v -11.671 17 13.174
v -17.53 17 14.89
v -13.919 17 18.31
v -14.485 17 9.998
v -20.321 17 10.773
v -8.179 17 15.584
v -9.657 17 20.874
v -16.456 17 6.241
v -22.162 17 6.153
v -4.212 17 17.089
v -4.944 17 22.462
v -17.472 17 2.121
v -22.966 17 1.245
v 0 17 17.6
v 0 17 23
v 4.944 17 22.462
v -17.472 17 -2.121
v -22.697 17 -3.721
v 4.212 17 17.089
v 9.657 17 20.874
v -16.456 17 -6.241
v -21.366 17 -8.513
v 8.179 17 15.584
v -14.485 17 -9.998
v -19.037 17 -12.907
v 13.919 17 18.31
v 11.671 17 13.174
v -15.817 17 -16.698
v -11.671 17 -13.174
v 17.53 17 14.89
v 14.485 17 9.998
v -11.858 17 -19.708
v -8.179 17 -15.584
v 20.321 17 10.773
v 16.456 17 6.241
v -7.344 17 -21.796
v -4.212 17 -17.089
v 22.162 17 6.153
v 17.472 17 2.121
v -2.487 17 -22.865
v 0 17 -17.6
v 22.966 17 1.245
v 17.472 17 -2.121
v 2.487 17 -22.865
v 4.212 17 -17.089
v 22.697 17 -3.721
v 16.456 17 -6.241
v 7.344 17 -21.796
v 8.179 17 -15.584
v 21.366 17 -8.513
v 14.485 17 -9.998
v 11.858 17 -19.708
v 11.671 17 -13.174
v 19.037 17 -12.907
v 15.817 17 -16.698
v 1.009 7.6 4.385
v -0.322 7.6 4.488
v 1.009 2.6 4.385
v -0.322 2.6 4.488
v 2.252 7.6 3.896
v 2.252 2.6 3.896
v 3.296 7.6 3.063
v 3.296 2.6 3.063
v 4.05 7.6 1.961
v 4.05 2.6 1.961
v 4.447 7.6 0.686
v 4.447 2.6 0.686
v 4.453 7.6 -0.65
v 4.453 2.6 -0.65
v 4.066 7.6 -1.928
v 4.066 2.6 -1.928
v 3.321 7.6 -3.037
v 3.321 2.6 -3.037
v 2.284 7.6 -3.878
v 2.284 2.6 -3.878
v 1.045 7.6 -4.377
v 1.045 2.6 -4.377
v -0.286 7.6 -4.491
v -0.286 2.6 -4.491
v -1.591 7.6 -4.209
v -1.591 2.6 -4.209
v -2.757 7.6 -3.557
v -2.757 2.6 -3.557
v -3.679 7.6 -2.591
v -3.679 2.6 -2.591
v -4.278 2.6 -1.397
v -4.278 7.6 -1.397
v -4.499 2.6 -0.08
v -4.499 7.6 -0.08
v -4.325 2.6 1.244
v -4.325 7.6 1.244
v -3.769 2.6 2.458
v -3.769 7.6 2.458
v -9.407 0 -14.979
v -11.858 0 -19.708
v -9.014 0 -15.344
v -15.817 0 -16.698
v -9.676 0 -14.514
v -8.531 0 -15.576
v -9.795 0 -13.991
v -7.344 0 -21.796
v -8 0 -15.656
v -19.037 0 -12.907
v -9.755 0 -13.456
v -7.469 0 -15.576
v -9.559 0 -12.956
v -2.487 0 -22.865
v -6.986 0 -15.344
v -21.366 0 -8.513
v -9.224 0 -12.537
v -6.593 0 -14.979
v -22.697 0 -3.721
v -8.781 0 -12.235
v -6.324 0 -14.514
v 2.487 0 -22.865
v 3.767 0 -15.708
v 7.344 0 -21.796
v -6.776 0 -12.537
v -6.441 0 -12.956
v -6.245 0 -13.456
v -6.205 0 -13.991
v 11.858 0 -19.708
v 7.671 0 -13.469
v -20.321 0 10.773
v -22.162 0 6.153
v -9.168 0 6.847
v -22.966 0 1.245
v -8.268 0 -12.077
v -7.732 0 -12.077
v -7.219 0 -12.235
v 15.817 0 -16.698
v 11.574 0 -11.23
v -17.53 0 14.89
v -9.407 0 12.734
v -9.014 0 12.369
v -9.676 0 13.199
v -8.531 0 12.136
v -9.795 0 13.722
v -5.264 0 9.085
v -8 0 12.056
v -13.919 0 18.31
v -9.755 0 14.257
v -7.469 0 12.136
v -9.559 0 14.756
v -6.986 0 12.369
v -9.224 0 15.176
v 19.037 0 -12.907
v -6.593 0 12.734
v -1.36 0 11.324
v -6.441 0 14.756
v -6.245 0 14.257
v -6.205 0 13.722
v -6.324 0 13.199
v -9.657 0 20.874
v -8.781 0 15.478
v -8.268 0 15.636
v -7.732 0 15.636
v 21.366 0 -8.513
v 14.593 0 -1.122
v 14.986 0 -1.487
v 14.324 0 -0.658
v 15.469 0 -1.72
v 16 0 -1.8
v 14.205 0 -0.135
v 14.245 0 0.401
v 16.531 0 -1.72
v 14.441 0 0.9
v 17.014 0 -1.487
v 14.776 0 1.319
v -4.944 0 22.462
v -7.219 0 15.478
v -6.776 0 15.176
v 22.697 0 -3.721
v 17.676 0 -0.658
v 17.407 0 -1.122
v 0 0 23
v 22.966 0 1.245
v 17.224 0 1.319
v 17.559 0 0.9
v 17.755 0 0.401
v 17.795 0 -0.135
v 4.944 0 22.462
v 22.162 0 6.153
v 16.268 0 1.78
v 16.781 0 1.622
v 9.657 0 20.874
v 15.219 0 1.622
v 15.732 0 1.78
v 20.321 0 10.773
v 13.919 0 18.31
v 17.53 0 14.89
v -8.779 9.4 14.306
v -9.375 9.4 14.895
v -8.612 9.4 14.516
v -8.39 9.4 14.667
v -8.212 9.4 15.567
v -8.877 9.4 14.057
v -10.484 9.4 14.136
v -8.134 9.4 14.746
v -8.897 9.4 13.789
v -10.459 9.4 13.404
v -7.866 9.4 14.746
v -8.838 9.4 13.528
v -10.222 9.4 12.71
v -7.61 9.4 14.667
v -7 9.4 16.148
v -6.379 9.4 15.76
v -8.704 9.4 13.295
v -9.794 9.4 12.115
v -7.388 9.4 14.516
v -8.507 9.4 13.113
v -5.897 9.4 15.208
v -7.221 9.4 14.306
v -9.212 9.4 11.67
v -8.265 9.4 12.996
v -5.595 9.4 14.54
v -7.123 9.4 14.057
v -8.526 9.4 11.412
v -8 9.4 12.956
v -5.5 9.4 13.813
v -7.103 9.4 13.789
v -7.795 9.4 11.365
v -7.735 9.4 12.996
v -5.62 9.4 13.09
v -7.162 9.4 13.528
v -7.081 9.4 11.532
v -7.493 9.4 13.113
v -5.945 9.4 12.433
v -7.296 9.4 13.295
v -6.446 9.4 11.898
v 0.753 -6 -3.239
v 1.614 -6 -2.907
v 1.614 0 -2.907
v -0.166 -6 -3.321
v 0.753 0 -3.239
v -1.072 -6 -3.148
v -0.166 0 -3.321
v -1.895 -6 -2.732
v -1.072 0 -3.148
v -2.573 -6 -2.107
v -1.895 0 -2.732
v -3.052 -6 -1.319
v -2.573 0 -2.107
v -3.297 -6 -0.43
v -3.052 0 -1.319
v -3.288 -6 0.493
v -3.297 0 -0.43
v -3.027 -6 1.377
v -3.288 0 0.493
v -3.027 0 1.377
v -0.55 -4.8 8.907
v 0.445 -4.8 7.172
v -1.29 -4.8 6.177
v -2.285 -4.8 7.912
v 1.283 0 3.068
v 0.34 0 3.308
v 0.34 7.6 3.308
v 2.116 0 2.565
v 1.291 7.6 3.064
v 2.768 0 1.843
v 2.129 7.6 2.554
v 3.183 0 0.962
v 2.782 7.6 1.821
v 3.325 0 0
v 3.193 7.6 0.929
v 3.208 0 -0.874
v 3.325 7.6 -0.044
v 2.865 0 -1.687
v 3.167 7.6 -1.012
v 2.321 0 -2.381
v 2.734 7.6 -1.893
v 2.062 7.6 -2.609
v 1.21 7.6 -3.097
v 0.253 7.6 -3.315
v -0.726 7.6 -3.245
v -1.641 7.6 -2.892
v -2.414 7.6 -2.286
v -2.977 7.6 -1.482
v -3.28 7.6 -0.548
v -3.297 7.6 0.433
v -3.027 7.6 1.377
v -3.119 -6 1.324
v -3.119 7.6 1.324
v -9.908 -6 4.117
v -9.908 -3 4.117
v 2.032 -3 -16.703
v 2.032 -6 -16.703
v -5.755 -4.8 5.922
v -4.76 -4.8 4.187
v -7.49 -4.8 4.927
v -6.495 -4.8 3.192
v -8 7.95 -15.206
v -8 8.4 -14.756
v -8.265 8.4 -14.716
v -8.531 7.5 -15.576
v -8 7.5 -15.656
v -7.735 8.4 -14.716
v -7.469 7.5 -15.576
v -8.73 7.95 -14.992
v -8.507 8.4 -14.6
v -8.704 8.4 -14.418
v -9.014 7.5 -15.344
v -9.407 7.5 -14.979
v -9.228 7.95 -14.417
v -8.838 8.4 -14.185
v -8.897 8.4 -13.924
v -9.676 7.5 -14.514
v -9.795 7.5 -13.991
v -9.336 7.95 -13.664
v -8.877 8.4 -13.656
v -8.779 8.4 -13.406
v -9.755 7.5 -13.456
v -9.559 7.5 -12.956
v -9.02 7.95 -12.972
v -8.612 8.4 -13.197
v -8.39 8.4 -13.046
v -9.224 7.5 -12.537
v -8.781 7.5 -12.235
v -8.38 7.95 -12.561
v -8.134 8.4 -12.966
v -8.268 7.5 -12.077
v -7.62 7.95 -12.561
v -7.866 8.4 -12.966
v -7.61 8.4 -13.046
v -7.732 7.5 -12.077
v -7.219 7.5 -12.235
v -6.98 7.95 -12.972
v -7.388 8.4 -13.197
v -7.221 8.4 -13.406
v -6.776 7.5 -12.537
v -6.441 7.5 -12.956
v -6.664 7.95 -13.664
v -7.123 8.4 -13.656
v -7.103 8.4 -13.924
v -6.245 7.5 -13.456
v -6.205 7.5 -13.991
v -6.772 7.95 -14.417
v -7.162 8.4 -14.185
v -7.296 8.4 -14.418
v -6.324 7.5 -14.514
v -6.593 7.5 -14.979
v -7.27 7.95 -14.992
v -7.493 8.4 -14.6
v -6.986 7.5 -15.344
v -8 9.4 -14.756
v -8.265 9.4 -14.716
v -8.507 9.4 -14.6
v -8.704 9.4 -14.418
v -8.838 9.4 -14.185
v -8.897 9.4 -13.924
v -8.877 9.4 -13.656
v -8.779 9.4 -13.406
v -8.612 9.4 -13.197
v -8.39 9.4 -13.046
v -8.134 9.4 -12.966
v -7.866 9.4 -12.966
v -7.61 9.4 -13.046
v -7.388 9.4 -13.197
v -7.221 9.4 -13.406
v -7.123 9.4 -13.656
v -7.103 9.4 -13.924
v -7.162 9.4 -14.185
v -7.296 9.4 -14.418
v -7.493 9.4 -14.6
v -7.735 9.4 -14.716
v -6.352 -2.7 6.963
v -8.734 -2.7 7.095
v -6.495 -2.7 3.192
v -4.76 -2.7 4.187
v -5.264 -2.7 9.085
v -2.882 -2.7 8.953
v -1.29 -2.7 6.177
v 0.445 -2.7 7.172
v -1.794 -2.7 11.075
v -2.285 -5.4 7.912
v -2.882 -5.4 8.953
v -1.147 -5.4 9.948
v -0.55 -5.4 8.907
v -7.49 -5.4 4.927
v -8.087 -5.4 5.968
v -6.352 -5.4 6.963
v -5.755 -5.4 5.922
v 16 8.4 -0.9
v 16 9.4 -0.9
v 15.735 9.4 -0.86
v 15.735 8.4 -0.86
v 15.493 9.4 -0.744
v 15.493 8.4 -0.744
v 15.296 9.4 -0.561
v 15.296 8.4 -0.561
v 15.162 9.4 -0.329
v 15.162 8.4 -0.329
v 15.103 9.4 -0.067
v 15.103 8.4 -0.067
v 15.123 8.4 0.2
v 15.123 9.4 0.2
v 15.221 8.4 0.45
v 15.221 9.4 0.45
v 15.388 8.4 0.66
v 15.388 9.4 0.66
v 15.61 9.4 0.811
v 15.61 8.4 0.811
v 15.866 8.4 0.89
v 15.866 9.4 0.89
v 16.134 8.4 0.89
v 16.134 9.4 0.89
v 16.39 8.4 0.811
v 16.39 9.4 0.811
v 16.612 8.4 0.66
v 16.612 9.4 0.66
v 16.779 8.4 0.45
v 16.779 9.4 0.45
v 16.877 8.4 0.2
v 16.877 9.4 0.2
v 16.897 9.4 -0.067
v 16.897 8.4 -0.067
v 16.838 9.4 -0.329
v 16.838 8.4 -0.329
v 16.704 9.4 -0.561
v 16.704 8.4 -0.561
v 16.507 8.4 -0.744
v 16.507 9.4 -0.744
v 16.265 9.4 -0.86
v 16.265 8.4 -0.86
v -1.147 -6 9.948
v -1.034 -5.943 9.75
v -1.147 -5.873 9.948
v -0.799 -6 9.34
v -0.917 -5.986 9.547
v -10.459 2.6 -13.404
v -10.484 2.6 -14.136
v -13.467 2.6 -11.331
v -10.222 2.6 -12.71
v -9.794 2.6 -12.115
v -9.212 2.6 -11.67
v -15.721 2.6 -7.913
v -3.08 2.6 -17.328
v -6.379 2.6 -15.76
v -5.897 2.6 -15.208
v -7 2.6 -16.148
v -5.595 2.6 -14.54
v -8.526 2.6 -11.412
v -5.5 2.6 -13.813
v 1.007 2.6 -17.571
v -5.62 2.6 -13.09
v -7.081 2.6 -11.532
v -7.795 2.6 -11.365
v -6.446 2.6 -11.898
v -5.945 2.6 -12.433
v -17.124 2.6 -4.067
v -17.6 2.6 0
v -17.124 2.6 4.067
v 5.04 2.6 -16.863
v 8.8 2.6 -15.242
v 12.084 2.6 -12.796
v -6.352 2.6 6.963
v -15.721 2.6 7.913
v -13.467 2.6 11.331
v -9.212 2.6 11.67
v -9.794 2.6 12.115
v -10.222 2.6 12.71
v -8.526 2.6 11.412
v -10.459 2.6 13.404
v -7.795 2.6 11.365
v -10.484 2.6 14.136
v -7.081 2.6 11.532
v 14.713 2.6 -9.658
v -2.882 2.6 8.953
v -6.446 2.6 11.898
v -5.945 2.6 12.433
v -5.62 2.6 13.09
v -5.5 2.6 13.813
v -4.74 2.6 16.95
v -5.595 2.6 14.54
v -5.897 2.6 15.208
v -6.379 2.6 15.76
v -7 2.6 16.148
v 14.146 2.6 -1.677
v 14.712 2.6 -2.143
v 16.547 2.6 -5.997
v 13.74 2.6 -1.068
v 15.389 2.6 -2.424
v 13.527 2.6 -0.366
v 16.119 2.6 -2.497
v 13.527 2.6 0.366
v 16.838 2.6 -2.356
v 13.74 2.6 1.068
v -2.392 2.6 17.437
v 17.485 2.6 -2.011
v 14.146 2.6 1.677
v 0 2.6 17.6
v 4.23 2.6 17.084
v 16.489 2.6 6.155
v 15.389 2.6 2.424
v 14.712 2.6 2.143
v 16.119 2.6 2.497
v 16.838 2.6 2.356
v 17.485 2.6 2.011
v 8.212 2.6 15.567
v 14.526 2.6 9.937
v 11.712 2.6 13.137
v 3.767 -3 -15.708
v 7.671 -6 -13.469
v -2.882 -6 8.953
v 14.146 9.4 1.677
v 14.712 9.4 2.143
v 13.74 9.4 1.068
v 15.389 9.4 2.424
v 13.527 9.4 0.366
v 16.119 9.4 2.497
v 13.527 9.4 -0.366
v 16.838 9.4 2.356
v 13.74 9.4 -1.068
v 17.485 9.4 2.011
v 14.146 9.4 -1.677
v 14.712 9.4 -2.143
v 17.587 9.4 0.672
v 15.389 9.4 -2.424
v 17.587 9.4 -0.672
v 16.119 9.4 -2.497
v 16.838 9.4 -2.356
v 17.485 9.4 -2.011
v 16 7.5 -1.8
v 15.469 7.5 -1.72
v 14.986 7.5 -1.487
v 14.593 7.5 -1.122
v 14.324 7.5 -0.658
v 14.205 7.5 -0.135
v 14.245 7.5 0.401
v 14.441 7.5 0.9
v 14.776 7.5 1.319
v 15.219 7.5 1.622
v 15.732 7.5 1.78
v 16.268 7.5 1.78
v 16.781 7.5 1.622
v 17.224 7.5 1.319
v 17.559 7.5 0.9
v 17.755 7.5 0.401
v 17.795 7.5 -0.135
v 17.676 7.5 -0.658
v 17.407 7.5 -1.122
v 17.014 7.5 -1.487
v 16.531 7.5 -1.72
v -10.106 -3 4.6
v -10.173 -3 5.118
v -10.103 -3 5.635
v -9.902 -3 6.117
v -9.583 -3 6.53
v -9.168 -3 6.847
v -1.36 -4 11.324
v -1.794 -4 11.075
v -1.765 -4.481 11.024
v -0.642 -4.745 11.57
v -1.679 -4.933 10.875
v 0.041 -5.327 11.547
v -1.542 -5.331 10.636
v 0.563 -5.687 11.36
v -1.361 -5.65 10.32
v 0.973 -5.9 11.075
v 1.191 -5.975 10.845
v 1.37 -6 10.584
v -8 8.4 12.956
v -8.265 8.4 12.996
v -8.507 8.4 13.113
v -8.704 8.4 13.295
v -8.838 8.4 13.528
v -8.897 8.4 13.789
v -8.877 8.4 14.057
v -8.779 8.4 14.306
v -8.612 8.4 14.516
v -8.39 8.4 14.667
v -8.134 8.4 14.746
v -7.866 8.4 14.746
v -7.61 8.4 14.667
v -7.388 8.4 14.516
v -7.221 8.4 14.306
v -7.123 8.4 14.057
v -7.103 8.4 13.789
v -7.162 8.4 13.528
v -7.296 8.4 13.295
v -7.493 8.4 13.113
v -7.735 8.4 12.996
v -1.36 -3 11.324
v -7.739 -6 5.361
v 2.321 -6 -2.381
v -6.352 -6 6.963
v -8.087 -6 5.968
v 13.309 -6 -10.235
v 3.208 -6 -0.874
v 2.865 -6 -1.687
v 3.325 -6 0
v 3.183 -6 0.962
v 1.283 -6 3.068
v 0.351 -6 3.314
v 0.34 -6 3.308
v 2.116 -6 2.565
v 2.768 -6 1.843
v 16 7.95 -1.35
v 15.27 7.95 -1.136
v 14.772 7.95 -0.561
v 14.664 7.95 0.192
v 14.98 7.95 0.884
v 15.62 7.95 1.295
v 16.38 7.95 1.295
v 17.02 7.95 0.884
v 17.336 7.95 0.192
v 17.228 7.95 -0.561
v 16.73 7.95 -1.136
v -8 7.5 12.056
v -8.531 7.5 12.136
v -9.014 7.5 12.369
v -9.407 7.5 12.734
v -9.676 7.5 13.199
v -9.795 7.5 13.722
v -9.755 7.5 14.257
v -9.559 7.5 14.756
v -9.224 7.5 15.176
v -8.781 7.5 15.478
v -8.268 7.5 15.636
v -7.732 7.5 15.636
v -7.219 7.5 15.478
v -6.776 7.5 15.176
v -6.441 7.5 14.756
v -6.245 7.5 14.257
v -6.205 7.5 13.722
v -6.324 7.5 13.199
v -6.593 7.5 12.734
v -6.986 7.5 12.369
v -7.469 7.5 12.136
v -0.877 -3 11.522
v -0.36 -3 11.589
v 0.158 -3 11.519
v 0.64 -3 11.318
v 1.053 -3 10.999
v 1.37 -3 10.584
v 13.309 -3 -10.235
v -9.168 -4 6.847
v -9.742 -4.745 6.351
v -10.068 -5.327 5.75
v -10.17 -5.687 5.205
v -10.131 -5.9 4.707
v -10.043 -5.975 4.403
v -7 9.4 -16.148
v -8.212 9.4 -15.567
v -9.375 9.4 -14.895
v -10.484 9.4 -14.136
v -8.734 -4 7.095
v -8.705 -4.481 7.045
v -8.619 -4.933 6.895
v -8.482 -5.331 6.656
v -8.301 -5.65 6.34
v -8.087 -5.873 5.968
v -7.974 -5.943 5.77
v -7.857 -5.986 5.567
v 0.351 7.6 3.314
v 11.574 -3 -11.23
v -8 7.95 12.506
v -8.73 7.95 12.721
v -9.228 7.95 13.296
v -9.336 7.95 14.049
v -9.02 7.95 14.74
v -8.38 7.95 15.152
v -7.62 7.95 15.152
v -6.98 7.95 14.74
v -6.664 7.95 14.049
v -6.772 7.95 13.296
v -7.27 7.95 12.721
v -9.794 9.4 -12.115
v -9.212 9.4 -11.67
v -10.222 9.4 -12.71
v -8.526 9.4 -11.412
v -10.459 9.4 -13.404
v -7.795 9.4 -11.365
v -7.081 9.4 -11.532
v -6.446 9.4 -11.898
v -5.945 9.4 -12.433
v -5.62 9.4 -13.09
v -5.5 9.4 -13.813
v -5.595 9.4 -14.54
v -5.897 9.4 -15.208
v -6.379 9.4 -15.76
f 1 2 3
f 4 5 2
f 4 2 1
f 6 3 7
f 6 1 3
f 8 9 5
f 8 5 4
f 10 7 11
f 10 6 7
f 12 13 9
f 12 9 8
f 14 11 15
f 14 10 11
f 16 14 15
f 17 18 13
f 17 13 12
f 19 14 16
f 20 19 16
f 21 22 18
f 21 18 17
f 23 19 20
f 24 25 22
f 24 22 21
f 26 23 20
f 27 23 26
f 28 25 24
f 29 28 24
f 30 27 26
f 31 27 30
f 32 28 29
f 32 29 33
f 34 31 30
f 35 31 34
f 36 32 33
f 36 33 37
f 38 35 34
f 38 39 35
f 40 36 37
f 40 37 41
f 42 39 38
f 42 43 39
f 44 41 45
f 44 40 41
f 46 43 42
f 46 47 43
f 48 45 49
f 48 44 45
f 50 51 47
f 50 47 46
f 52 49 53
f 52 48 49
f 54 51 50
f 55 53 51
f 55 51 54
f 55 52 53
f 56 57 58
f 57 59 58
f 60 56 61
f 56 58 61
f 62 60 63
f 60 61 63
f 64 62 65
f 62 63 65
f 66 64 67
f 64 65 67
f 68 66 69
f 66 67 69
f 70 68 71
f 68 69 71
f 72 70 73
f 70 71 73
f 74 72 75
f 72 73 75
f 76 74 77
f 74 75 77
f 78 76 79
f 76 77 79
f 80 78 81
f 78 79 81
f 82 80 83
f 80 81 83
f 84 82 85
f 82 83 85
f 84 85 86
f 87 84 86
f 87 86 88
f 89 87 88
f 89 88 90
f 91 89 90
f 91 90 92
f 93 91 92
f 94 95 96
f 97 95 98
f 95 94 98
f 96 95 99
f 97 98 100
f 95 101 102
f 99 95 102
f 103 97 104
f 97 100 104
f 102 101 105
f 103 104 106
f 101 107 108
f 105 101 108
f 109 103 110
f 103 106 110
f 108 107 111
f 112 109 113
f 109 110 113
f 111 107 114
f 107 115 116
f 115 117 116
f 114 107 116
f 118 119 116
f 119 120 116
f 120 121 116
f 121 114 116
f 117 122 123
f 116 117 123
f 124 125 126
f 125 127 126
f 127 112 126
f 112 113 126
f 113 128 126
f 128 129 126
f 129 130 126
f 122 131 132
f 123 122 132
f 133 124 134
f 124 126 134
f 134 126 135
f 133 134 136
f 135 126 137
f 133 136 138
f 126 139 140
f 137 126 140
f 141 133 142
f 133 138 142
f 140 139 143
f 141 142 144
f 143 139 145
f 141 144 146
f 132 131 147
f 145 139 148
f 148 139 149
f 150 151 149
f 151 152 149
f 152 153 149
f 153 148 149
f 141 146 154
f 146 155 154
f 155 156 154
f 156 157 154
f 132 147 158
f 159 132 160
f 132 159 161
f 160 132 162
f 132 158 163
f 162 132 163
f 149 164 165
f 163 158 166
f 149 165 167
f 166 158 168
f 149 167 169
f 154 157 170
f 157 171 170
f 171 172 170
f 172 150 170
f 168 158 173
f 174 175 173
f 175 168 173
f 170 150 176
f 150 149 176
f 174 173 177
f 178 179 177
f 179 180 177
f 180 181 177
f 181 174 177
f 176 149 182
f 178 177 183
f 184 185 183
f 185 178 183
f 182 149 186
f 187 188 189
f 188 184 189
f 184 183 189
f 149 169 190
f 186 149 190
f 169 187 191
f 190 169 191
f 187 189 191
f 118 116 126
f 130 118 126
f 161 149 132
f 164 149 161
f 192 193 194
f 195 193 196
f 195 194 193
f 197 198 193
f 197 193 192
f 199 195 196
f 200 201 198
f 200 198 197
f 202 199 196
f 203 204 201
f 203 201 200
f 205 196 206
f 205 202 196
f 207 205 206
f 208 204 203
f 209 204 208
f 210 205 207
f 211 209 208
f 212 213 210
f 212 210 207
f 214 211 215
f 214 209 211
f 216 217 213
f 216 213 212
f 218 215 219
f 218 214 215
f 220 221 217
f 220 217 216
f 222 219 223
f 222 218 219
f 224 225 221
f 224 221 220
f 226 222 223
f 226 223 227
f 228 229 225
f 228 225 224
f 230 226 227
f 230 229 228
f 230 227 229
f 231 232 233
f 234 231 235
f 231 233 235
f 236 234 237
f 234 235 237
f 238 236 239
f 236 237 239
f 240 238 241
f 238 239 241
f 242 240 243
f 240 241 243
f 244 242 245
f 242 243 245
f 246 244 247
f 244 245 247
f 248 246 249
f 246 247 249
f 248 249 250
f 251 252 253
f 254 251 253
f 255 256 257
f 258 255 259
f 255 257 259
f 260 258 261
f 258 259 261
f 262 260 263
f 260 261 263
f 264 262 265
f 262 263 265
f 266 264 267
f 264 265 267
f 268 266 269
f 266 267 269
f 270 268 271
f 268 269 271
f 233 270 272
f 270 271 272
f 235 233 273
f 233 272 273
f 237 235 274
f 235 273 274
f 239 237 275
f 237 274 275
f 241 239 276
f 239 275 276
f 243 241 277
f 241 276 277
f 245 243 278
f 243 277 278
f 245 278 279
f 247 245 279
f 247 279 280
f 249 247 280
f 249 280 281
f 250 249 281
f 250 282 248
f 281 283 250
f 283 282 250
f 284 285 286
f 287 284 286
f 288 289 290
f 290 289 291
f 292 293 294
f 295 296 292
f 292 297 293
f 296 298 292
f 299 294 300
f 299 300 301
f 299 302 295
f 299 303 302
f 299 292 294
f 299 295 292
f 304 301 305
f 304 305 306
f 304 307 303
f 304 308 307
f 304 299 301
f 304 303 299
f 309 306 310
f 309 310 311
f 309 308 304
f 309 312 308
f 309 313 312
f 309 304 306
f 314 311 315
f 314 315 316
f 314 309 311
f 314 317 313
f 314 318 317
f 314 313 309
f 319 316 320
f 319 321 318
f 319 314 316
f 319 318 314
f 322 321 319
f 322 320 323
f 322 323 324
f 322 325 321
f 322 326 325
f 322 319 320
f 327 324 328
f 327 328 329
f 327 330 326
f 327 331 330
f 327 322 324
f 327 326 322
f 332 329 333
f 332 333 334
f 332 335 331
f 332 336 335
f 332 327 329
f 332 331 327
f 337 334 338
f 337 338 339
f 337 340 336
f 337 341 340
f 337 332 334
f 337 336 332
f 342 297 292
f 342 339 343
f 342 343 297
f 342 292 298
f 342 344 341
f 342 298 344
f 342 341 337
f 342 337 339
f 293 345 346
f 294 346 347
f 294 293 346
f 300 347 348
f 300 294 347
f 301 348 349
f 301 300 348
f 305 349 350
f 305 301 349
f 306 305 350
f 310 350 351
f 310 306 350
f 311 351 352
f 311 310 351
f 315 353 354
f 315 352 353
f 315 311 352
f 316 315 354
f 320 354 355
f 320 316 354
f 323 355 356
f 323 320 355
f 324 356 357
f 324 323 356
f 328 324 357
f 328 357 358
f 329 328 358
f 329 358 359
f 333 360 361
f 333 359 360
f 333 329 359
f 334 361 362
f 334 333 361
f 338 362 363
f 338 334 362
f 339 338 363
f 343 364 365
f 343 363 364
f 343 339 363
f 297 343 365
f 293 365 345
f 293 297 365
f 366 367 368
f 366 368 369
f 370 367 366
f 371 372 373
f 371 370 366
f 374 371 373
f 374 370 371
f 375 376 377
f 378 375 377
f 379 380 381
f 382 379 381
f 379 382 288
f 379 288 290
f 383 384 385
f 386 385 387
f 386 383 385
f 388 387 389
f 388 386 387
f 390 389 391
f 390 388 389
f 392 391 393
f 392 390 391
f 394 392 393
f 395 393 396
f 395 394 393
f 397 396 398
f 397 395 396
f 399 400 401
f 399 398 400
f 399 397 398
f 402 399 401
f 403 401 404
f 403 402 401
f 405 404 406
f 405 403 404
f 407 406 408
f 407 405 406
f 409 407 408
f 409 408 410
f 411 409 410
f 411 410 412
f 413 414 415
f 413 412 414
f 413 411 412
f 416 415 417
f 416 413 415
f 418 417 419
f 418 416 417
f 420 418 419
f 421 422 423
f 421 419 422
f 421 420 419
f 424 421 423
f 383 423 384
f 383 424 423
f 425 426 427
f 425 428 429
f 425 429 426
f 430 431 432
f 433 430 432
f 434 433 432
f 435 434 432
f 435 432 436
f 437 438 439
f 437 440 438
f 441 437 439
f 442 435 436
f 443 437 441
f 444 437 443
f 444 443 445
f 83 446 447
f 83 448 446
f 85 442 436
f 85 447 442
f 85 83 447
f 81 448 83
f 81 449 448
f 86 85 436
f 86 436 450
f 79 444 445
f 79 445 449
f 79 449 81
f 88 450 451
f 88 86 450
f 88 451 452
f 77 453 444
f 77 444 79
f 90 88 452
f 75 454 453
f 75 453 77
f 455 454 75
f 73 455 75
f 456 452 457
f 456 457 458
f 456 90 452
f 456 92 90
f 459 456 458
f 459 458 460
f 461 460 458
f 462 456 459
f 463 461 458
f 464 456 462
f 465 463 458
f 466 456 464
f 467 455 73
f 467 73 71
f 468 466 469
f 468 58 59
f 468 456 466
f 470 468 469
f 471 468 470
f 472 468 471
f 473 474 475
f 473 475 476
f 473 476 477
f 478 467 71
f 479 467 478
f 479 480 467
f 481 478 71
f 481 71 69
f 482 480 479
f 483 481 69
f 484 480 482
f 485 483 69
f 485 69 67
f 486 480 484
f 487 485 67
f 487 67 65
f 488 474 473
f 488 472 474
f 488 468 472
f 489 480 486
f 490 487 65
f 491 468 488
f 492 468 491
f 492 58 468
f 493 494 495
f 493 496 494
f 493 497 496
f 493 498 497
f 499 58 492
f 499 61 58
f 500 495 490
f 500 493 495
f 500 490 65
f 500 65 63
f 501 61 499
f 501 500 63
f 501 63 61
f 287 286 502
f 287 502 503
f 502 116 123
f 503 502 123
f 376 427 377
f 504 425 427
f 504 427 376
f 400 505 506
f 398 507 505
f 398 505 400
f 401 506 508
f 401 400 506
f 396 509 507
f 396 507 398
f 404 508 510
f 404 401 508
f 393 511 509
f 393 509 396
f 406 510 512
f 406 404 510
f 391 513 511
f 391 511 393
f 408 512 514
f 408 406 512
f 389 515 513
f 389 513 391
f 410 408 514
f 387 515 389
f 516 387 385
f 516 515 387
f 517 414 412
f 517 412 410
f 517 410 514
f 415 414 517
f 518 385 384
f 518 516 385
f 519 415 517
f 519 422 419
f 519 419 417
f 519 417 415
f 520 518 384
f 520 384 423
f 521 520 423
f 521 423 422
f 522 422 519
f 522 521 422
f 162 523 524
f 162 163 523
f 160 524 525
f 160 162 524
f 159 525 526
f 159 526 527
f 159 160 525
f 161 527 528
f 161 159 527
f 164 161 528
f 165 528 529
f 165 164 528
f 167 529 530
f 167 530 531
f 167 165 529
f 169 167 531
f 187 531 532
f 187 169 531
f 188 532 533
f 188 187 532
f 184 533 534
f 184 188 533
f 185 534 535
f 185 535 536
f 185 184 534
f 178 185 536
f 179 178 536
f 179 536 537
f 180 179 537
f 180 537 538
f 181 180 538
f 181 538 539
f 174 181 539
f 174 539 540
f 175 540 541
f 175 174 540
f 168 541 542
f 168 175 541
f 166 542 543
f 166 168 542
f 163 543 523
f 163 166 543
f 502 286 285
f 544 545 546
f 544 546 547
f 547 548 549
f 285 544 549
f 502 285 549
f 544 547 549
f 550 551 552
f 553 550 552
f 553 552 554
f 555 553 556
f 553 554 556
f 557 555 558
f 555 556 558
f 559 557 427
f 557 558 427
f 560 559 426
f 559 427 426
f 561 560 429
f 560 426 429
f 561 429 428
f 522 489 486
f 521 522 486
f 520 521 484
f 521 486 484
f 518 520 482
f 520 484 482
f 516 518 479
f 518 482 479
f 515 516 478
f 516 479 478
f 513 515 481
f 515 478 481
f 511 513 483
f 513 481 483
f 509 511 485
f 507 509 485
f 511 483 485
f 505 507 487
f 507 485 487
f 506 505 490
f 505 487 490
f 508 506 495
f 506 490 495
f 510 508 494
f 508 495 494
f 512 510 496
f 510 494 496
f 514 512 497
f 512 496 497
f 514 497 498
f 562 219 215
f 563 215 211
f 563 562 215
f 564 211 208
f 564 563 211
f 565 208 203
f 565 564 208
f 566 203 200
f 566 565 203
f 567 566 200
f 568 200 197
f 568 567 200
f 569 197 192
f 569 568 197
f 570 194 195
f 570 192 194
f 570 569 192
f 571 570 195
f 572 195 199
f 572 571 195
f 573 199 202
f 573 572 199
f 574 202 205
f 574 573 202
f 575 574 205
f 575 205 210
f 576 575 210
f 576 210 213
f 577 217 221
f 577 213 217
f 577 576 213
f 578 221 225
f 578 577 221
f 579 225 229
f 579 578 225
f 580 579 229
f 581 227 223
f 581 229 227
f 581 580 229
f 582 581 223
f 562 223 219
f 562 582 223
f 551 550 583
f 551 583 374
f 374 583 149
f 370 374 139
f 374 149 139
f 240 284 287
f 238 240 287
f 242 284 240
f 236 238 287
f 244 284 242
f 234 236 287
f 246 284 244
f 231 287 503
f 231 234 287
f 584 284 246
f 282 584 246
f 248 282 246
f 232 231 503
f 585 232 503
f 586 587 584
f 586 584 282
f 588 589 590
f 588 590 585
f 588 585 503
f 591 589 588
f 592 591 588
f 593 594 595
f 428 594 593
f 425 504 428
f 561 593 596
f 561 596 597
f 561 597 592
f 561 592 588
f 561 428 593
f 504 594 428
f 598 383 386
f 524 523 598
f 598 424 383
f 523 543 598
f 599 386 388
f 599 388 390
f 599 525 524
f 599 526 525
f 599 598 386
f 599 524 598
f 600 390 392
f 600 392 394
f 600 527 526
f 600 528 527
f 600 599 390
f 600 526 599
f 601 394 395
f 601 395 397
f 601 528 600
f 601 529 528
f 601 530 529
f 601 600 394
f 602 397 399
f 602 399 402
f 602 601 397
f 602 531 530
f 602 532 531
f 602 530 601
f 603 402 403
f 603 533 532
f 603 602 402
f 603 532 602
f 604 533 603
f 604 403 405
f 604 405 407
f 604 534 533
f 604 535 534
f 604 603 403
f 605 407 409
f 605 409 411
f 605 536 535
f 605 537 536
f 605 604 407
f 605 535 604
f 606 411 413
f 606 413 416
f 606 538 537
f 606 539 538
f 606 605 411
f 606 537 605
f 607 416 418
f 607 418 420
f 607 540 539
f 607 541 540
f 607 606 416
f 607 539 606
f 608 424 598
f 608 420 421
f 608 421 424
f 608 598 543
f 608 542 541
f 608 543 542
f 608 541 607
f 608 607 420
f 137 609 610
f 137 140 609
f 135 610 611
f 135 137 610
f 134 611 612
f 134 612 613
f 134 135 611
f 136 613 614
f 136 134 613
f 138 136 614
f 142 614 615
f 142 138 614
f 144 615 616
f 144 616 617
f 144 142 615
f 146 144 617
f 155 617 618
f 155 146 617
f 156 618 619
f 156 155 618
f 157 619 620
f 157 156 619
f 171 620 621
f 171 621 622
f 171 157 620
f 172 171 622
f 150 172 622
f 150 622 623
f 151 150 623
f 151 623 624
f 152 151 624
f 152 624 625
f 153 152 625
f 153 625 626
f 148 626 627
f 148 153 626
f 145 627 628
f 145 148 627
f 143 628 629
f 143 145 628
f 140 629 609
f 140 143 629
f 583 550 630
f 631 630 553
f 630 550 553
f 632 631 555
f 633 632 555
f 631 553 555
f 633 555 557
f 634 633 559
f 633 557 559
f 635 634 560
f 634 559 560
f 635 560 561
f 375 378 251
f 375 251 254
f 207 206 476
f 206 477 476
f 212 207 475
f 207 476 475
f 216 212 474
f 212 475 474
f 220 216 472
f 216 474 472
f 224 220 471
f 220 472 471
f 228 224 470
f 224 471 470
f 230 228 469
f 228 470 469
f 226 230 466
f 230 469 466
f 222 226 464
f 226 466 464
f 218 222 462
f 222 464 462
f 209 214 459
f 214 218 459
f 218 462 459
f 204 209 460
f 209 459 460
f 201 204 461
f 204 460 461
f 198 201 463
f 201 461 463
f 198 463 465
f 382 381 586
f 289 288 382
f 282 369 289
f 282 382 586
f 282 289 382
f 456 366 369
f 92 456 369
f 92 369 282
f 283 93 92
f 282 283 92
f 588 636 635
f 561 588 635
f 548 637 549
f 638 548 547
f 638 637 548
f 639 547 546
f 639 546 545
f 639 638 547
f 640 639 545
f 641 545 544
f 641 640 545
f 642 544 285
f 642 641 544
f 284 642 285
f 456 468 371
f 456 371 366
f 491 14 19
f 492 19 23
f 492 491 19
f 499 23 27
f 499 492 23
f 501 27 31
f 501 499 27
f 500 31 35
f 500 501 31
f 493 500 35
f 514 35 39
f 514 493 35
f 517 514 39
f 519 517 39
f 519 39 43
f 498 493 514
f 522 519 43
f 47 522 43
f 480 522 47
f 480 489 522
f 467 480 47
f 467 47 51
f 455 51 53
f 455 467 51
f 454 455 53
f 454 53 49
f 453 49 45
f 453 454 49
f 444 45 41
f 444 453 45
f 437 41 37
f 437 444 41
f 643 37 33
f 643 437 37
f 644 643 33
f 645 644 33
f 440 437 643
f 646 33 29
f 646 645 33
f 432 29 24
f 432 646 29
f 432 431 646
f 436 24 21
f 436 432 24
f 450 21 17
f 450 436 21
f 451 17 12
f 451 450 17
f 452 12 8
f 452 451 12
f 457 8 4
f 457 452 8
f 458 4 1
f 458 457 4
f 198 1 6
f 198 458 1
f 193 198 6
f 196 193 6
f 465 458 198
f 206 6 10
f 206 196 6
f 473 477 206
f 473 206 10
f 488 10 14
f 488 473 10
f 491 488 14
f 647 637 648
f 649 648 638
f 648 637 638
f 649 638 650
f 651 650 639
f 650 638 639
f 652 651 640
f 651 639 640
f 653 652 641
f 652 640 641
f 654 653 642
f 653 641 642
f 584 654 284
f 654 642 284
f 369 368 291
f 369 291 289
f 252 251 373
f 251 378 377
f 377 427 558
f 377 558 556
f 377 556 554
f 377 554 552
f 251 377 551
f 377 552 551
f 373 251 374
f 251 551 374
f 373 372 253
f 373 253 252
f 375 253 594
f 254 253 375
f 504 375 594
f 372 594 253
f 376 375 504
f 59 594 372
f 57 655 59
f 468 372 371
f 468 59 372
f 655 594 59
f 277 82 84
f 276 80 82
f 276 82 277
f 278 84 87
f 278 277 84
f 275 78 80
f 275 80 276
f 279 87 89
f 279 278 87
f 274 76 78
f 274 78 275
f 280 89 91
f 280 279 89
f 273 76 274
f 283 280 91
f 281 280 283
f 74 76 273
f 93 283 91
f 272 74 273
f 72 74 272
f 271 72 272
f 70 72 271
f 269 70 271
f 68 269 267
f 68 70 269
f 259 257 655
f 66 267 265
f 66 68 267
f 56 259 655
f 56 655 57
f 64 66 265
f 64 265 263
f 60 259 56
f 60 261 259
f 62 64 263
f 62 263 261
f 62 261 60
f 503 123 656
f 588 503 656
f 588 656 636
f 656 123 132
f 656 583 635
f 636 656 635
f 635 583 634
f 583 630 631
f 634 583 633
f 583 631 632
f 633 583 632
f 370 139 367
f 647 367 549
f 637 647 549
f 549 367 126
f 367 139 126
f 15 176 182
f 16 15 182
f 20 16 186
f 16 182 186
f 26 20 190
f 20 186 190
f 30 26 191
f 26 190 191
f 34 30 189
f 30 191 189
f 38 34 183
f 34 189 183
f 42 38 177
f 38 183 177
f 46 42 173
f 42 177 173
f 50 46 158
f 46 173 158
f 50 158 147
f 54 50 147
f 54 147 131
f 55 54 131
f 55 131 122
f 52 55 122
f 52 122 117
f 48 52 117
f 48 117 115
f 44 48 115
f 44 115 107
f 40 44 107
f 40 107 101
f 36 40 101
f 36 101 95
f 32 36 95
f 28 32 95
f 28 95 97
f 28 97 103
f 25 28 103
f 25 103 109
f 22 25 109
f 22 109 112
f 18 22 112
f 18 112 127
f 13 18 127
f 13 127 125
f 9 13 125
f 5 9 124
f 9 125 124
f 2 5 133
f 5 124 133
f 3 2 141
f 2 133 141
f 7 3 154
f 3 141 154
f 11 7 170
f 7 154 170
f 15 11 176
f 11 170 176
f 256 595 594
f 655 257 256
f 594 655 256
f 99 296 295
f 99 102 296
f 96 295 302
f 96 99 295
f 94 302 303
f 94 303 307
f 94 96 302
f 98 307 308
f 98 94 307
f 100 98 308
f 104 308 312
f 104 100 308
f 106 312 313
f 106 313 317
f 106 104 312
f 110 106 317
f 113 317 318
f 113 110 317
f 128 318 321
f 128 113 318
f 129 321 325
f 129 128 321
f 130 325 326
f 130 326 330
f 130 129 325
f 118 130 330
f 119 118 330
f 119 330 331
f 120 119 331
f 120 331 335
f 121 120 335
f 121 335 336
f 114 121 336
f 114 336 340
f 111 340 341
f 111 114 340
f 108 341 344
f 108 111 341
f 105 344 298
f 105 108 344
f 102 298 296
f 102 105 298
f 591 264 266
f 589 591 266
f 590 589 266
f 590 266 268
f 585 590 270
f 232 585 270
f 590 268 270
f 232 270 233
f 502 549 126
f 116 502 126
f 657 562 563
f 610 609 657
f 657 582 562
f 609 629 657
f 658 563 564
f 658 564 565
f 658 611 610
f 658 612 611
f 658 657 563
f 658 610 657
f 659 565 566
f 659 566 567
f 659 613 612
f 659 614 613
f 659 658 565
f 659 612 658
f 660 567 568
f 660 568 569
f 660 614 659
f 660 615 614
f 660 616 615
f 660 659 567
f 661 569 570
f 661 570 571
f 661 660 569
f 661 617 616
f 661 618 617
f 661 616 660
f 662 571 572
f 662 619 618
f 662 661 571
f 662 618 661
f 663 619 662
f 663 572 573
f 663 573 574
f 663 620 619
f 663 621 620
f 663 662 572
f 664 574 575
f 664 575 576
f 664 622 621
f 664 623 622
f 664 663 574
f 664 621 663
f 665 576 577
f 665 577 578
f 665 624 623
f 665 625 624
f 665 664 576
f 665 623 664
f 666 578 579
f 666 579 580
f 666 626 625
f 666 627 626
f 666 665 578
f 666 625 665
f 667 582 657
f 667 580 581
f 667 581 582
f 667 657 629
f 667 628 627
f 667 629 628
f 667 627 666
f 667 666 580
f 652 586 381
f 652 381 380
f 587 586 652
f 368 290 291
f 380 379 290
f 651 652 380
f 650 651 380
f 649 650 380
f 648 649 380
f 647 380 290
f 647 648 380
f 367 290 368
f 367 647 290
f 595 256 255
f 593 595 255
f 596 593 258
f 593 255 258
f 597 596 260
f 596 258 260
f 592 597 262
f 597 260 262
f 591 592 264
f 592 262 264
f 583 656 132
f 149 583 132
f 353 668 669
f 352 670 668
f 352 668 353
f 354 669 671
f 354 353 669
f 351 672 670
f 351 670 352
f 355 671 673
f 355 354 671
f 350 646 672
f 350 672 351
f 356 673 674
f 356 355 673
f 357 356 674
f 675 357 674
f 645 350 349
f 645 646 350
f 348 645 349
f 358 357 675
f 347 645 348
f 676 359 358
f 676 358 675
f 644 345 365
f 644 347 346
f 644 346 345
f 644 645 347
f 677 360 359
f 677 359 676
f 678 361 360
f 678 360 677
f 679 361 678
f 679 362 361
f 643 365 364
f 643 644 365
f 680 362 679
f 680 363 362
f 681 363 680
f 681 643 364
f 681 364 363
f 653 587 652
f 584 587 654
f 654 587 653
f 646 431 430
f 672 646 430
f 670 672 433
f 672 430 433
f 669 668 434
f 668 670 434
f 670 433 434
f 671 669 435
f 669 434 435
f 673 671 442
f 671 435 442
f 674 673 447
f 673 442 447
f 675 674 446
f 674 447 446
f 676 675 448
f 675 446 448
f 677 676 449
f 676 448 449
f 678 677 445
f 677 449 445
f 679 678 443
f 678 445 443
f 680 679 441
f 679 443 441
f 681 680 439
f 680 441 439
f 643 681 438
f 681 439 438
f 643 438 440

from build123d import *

# Parameters (mm, degrees)
SKETCH1_R                                    = 23
BOSS_EXTRUDE1_DEPTH                          = 17
SHELL1_T                                     = -2.6
SKETCH4_R                                    = 4.5
BOSS_EXTRUDE3_DEPTH                          = 5
SKETCH5_R                                    = 3.325
CUT_EXTRUDE2_DEPTH                           = 34.857938508
SKETCH22_R                                   = 20.4
SKETCH22_R_2                                 = 17.6
BOSS_EXTRUDE10_DEPTH                         = 14.4
SKETCH24_R                                   = 2.5
BOSS_EXTRUDE11_DEPTH                         = 6.8
CSK_SLOT_FOR_M1_6_COUNTERSUNK_FLAT_H_2_COUNT = 2
CSK_SLOT_FOR_M1_6_COUNTERSUNK_FLAT_H_2_PITCH = 27.712812921
CSK_SLOT_FOR_M1_6_COUNTERSUNK_FLAT_H_3_COUNT = 2
CSK_SLOT_FOR_M1_6_COUNTERSUNK_FLAT_H_3_PITCH = 27.712812921
BOSS_EXTRUDE12_DEPTH                         = 6
SKETCH29_W                                   = 2
SKETCH29_H                                   = 3
CUT_EXTRUDE5_DEPTH                           = 47.005728796
FILLET2_R                                    = 2
SKETCH30_W                                   = 8
SKETCH30_H                                   = 3.3
CUT_EXTRUDE6_DEPTH                           = 4.5
BOSS_EXTRUDE13_DEPTH                         = 0.6
BOSS_EXTRUDE14_DEPTH                         = 0.6
CUT_EXTRUDE7_START                           = -13.6
CUT_EXTRUDE7_DEPTH                           = 13.6


# Read off the part's stored shape, not the designer's step: Cut-Extrude7
with BuildPart() as part:
    # Sketch1 → Boss-Extrude1 (new body)
    with BuildSketch(Plane(origin=(0, 0, 0), x_dir=(1, 0, 0), z_dir=(0, 1, 0))):
        with Locations(Location((0, 0, 0), (0, 0, 270))):
            Circle(SKETCH1_R)
    extrude(amount=BOSS_EXTRUDE1_DEPTH)

    # Shell1
    shell1_openings = [part.faces().sort_by_distance(p)[0] for p in [
        (0, 17, 0),
    ]]
    offset(amount=SHELL1_T, openings=shell1_openings, kind=Kind.INTERSECTION)

    # Sketch4 → Boss-Extrude3 (add)
    with BuildSketch(Plane(origin=(0, 2.6, 0), x_dir=(1, 0, 0), z_dir=(0, 1, 0))):
        with Locations(Location((0, 0, 0), (0, 0, 270))):
            Circle(SKETCH4_R)
    extrude(amount=BOSS_EXTRUDE3_DEPTH)

    # Sketch5 → Cut-Extrude2 (cut, through all)
    with BuildSketch(Plane(origin=(0, 7.6, 0), x_dir=(1, 0, 0), z_dir=(0, 1, 0))):
        with Locations(Location((0, 0, 0), (0, 0, 270))):
            Circle(SKETCH5_R)
    extrude(amount=-CUT_EXTRUDE2_DEPTH, mode=Mode.SUBTRACT)

    # Sketch22 → Boss-Extrude10 (add)
    with BuildSketch(Plane(origin=(0, 2.6, 0), x_dir=(1, 0, 0), z_dir=(0, 1, 0))):
        Circle(SKETCH22_R)
        with Locations(Location((0, 0, 0), (0, 0, 270))):
            Circle(SKETCH22_R_2, mode=Mode.SUBTRACT)
    extrude(amount=BOSS_EXTRUDE10_DEPTH)

    # Sketch24 → Boss-Extrude11 (add)
    with BuildSketch(Plane(origin=(0, 2.6, 0), x_dir=(1, 0, 0), z_dir=(0, 1, 0))):
        with Locations((-8, 13.856406461)):
            Circle(SKETCH24_R)
        with Locations((16, 0)):
            Circle(SKETCH24_R)
        with Locations((-8, -13.856406461)):
            Circle(SKETCH24_R)
    extrude(amount=BOSS_EXTRUDE11_DEPTH)

    # Sketch26 → CSK SLOT for M1.6 Countersunk Flat Head (revolve, cut)
    with BuildSketch(Plane(origin=(-8, 0, 13.856406461), x_dir=(0, 0, -1), z_dir=(1, 0, 0))):
        Polygon((0, 0), (0, 17), (0.9, 17), (0.9, 8.4), (1.8, 7.5), (1.8, 0), align=None)
    csk_slot_for_m1_6_countersunk_flat_head = revolve(axis=Axis((-8, -6.35, 13.856406461), (0, 1, 0)), mode=Mode.SUBTRACT)

    # CSK SLOT for M1.6 Countersunk Flat H 2: CSK SLOT for M1.6 Countersunk Flat Head ×2
    with Locations(*[(0, 0, -i * CSK_SLOT_FOR_M1_6_COUNTERSUNK_FLAT_H_2_PITCH) for i in range(1, CSK_SLOT_FOR_M1_6_COUNTERSUNK_FLAT_H_2_COUNT)]):
        add(csk_slot_for_m1_6_countersunk_flat_head, mode=Mode.SUBTRACT)

    # CSK SLOT for M1.6 Countersunk Flat H 3: CSK SLOT for M1.6 Countersunk Flat Head ×2
    with Locations(*[Vector(0.8660254037844364, 0, -0.5000000000000041) * (i * CSK_SLOT_FOR_M1_6_COUNTERSUNK_FLAT_H_3_PITCH) for i in range(1, CSK_SLOT_FOR_M1_6_COUNTERSUNK_FLAT_H_3_COUNT)]):
        add(csk_slot_for_m1_6_countersunk_flat_head, mode=Mode.SUBTRACT)

    # Sketch28 → Boss-Extrude12 (add)
    with BuildSketch(Plane.XZ):
        with BuildLine():
            Line((-1.694333823, 2.860919065), (-5.263926338, 9.085385824))
            Line((-5.263926338, 9.085385824), (-10.902522986, 5.851776718))
            Line((-10.902522986, 5.851776718), (2.031913438, -16.702609871))
            Line((2.031913438, -16.702609871), (7.670510085, -13.469000765))
            Line((7.670510085, -13.469000765), (1.613572817, -2.907233696))
            ThreePointArc((1.613572817, -2.907233696), (-2.884359054, -1.654115427), (-1.694333823, 2.860919065))
        make_face()
        with BuildLine():
            Line((0.374670309, 12.31899493), (-5.263926338, 9.085385824))
            Line((-5.263926338, 9.085385824), (-1.694333823, 2.860919065))
            ThreePointArc((-1.694333823, 2.860919065), (1.646506155, 2.888709484), (3.325, 0))
            ThreePointArc((3.325, 0), (2.865375597, -1.686786202), (1.613572817, -2.907233696))
            Line((1.613572817, -2.907233696), (7.670510085, -13.469000765))
            Line((7.670510085, -13.469000765), (13.309106732, -10.23539166))
            Line((13.309106732, -10.23539166), (0.374670309, 12.31899493))
        make_face()
    extrude(amount=BOSS_EXTRUDE12_DEPTH)

    # Sketch29 → Cut-Extrude5 (cut, through all)
    with BuildSketch(Plane(origin=(-5.223545836, 0, 9.108543139), x_dir=(0.8674764072728275, 0, 0.4974783239750529), z_dir=(-0.4974783239750529, 0, 0.8674764072728275))):
        with Locations((-5.546549396, -1.5)):
            Rectangle(SKETCH29_W, SKETCH29_H)
        with Locations((5.453450604, -1.5)):
            Rectangle(SKETCH29_W, SKETCH29_H)
    extrude(amount=-CUT_EXTRUDE5_DEPTH, mode=Mode.SUBTRACT)

    # Fillet2
    fillet2_edges = [part.edges().sort_by_distance(p)[0] for p in [
        (-10.902522986, -4.5, 5.851776718),
        (0.374670309, -4.5, 12.31899493),
        (-5.263926338, -6, 9.085385824),
    ]]
    fillet(fillet2_edges, radius=FILLET2_R)

    # Sketch30 → Cut-Extrude6 (cut)
    with BuildSketch(Plane(origin=(-5.223545836, 0, 9.108543139), x_dir=(0.8674764072728275, 0, 0.4974783239750529), z_dir=(-0.4974783239750529, 0, 0.8674764072728275))):
        with Locations((-0.046549396, -4.35)):
            Rectangle(SKETCH30_W, SKETCH30_H)
    extrude(amount=-CUT_EXTRUDE6_DEPTH, mode=Mode.SUBTRACT)

    # Sketch31 → Boss-Extrude13 (add)
    with BuildSketch(Plane.XZ.offset(6)):
        Polygon((-6.49517951, 3.191828695), (0.444631749, 7.171655287), (-1.147298888, 9.94757979), (-8.087110146, 5.967753198), align=None)
    extrude(amount=-BOSS_EXTRUDE13_DEPTH)

    # Sketch33 → Boss-Extrude14 (add)
    with BuildSketch(Plane(origin=(0, -5.4, 0), x_dir=(1, 0, 0), z_dir=(0, 1, 0))):
        Polygon((-6.49517951, -3.191828695), (0.444631749, -7.171655287), (-0.550324899, -8.906608101), (-7.490136157, -4.92678151), align=None)
    extrude(amount=BOSS_EXTRUDE14_DEPTH)

    # Cut-Extrude7 outline → Cut-Extrude7 (cut)
    with BuildSketch(Plane.XZ.offset(6).offset(CUT_EXTRUDE7_START)):
        with BuildLine():
            Line((-3.118548226, 1.324113199), (-3.026514963, 1.376892218))
            ThreePointArc((-3.026514963, 1.376892218), (-1.654115427, 2.884359054), (0.340085146, 3.307562107))
            Line((0.340085146, 3.307562107), (0.351357403, 3.314026495))
            Line((0.351357403, 3.314026495), (-2.882251703, 8.952623142))
            Line((-2.882251703, 8.952623142), (-6.352157332, 6.962709846))
            Line((-6.352157332, 6.962709846), (-3.118548226, 1.324113199))
        make_face()
    extrude(amount=CUT_EXTRUDE7_DEPTH, mode=Mode.SUBTRACT)


solid = part.part
